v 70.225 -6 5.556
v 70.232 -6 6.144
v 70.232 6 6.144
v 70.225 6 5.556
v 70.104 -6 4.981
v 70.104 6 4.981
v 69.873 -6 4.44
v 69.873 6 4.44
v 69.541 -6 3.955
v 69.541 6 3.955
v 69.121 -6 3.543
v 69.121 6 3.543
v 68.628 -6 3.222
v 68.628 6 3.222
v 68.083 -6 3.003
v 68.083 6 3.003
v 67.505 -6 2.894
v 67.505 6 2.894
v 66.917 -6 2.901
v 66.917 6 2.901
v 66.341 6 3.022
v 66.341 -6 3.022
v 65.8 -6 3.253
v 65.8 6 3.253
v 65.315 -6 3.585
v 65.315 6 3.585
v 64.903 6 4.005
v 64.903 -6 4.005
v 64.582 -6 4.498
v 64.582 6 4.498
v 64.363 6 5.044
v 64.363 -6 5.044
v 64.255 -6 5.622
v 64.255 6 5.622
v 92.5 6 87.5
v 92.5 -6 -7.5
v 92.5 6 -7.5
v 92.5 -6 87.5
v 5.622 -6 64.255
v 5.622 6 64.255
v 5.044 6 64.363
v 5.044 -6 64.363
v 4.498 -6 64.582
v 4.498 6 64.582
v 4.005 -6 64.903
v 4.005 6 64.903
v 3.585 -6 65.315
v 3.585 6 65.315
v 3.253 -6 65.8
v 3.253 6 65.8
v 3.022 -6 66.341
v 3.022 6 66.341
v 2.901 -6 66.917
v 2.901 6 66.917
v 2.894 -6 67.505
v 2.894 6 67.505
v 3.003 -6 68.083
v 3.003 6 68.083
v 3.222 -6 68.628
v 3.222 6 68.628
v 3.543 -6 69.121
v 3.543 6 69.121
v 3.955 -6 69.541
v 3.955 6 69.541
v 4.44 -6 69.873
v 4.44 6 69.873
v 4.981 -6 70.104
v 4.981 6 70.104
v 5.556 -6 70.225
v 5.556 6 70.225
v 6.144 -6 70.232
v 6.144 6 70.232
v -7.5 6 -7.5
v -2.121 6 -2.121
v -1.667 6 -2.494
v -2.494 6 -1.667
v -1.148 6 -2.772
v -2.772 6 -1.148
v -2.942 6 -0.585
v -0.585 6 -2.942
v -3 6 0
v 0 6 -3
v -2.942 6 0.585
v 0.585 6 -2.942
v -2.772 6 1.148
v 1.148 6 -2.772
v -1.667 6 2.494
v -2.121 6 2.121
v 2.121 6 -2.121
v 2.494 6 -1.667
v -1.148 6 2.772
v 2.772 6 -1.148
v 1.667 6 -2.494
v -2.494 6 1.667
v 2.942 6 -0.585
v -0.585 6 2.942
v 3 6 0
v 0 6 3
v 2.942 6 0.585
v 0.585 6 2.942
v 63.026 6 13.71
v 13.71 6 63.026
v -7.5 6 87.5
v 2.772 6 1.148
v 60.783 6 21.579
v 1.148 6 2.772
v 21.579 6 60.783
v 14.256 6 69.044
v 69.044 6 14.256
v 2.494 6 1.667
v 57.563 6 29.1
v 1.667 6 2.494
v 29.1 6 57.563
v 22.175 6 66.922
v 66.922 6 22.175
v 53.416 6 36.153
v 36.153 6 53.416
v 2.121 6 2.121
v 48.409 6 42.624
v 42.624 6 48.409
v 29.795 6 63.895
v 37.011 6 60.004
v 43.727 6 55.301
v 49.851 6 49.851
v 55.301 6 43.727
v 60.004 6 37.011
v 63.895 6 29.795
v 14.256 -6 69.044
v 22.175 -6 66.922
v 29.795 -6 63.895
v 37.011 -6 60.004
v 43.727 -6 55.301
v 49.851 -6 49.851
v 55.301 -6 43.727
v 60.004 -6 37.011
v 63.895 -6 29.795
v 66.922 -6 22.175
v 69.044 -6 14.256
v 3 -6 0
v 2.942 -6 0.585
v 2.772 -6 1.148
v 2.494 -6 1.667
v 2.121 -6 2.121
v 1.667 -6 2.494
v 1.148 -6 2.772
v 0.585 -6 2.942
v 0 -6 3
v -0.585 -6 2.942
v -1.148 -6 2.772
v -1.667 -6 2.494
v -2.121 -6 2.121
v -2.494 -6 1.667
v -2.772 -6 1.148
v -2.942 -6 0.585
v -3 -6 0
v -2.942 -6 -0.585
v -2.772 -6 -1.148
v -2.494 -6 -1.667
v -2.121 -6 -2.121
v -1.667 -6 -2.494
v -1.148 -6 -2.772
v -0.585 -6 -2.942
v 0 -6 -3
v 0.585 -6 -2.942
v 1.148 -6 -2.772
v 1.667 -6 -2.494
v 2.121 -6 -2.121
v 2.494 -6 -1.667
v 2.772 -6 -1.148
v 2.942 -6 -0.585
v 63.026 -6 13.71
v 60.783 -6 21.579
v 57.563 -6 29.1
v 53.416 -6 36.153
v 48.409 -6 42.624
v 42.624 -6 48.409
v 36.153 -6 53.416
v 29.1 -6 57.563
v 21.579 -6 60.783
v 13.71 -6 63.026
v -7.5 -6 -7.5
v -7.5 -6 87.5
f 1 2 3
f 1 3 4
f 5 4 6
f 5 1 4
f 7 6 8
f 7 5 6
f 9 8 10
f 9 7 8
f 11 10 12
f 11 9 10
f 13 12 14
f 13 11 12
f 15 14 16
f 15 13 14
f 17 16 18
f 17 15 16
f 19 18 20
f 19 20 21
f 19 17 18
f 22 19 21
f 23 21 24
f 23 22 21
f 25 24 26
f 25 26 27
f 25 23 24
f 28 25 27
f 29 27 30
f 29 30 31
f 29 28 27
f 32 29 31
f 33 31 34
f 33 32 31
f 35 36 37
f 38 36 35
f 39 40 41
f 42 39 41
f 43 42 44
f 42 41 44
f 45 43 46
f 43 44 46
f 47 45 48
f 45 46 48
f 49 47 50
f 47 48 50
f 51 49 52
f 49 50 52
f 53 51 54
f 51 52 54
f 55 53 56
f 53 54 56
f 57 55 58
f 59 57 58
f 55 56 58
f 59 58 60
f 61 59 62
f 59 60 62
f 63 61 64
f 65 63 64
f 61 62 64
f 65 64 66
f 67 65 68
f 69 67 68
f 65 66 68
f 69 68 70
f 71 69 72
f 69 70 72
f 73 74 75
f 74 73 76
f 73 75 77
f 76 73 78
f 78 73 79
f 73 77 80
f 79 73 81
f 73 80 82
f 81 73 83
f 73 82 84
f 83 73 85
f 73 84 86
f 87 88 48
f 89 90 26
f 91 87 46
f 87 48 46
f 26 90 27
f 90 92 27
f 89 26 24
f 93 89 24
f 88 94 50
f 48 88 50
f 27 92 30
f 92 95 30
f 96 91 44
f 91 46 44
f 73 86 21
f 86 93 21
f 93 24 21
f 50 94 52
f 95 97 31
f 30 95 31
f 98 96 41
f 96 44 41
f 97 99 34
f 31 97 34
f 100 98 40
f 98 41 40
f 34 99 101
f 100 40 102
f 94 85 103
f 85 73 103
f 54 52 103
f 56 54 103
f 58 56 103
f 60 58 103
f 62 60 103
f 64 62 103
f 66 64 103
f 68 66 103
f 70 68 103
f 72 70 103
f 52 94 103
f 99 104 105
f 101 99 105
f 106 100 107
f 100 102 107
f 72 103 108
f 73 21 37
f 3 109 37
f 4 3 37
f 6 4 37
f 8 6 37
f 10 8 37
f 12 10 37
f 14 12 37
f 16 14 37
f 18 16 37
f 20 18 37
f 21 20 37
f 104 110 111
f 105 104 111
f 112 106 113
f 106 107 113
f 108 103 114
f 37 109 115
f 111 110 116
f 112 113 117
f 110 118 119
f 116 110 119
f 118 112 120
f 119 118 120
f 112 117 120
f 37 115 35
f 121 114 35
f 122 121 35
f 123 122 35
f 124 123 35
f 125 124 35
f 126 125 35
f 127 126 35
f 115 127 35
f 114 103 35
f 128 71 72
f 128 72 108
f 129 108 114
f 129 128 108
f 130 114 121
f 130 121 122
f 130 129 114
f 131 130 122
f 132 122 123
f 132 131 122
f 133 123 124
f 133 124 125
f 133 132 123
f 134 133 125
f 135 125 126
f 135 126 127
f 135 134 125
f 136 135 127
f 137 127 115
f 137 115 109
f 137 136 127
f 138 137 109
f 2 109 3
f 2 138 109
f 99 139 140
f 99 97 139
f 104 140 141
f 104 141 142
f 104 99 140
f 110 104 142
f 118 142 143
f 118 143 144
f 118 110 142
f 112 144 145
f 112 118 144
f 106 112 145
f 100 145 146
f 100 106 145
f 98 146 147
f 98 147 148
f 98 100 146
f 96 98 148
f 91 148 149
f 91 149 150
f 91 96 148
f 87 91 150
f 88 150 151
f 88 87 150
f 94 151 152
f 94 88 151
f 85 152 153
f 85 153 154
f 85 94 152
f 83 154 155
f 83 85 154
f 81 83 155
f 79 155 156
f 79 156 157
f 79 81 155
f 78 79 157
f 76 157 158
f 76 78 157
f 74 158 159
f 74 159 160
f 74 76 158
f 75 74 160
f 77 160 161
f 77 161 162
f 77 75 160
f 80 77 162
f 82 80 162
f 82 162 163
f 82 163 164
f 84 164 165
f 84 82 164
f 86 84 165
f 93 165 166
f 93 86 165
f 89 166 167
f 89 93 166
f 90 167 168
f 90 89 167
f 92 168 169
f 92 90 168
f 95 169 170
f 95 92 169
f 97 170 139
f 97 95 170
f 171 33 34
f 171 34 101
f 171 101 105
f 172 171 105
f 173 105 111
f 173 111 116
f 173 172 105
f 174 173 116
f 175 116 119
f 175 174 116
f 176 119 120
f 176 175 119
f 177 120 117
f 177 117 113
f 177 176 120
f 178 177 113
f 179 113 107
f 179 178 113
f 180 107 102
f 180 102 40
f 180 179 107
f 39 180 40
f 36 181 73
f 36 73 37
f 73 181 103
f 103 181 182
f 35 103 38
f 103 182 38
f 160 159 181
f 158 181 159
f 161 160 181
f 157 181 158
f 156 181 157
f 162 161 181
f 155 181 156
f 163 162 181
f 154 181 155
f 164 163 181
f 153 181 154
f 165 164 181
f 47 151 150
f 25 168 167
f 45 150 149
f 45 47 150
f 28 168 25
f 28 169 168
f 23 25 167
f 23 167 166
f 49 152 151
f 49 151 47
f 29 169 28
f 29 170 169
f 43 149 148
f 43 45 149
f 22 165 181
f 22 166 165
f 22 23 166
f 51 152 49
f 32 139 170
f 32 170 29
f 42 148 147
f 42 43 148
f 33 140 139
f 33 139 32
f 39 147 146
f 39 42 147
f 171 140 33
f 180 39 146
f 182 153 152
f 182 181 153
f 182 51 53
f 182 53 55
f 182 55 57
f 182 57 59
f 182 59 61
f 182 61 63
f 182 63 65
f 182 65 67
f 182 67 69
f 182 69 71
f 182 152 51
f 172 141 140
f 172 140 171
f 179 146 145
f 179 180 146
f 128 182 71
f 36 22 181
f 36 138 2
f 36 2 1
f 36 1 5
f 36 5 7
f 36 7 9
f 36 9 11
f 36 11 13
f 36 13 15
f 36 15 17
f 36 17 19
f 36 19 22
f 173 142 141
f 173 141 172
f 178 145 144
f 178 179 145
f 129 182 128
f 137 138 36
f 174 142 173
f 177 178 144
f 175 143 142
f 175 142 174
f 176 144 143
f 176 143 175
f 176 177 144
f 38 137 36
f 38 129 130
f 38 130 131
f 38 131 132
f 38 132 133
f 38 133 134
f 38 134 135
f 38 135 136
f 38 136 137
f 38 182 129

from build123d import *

# Parameters (mm, degrees)
F0_W     = 100
F0_H     = 95
F0_R     = 3
F1_DEPTH = 6


with BuildPart() as f1:
    # F0 (on Front) → F1 (new body, symmetric)
    with BuildSketch(Plane.XZ):
        with Locations((42.5, 40)):
            Rectangle(F0_W, F0_H)
        Circle(F0_R, mode=Mode.SUBTRACT)
        with BuildLine():
            ThreePointArc((5.6215454072, 64.2545580269), (2.8944285412, 67.5046093494), (6.1444798637, 70.2317262155))
            ThreePointArc((6.1444798637, 70.2317262155), (49.8510280737, 49.8510280737), (70.2317262155, 6.1444798637))
            ThreePointArc((70.2317262155, 6.1444798637), (67.5046093494, 2.8944285412), (64.2545580269, 5.6215454072))
            ThreePointArc((64.2545580269, 5.6215454072), (45.6083873865, 45.6083873865), (5.6215454072, 64.2545580269))
        make_face(mode=Mode.SUBTRACT)
    extrude(amount=F1_DEPTH, both=True)


solid = f1.part
